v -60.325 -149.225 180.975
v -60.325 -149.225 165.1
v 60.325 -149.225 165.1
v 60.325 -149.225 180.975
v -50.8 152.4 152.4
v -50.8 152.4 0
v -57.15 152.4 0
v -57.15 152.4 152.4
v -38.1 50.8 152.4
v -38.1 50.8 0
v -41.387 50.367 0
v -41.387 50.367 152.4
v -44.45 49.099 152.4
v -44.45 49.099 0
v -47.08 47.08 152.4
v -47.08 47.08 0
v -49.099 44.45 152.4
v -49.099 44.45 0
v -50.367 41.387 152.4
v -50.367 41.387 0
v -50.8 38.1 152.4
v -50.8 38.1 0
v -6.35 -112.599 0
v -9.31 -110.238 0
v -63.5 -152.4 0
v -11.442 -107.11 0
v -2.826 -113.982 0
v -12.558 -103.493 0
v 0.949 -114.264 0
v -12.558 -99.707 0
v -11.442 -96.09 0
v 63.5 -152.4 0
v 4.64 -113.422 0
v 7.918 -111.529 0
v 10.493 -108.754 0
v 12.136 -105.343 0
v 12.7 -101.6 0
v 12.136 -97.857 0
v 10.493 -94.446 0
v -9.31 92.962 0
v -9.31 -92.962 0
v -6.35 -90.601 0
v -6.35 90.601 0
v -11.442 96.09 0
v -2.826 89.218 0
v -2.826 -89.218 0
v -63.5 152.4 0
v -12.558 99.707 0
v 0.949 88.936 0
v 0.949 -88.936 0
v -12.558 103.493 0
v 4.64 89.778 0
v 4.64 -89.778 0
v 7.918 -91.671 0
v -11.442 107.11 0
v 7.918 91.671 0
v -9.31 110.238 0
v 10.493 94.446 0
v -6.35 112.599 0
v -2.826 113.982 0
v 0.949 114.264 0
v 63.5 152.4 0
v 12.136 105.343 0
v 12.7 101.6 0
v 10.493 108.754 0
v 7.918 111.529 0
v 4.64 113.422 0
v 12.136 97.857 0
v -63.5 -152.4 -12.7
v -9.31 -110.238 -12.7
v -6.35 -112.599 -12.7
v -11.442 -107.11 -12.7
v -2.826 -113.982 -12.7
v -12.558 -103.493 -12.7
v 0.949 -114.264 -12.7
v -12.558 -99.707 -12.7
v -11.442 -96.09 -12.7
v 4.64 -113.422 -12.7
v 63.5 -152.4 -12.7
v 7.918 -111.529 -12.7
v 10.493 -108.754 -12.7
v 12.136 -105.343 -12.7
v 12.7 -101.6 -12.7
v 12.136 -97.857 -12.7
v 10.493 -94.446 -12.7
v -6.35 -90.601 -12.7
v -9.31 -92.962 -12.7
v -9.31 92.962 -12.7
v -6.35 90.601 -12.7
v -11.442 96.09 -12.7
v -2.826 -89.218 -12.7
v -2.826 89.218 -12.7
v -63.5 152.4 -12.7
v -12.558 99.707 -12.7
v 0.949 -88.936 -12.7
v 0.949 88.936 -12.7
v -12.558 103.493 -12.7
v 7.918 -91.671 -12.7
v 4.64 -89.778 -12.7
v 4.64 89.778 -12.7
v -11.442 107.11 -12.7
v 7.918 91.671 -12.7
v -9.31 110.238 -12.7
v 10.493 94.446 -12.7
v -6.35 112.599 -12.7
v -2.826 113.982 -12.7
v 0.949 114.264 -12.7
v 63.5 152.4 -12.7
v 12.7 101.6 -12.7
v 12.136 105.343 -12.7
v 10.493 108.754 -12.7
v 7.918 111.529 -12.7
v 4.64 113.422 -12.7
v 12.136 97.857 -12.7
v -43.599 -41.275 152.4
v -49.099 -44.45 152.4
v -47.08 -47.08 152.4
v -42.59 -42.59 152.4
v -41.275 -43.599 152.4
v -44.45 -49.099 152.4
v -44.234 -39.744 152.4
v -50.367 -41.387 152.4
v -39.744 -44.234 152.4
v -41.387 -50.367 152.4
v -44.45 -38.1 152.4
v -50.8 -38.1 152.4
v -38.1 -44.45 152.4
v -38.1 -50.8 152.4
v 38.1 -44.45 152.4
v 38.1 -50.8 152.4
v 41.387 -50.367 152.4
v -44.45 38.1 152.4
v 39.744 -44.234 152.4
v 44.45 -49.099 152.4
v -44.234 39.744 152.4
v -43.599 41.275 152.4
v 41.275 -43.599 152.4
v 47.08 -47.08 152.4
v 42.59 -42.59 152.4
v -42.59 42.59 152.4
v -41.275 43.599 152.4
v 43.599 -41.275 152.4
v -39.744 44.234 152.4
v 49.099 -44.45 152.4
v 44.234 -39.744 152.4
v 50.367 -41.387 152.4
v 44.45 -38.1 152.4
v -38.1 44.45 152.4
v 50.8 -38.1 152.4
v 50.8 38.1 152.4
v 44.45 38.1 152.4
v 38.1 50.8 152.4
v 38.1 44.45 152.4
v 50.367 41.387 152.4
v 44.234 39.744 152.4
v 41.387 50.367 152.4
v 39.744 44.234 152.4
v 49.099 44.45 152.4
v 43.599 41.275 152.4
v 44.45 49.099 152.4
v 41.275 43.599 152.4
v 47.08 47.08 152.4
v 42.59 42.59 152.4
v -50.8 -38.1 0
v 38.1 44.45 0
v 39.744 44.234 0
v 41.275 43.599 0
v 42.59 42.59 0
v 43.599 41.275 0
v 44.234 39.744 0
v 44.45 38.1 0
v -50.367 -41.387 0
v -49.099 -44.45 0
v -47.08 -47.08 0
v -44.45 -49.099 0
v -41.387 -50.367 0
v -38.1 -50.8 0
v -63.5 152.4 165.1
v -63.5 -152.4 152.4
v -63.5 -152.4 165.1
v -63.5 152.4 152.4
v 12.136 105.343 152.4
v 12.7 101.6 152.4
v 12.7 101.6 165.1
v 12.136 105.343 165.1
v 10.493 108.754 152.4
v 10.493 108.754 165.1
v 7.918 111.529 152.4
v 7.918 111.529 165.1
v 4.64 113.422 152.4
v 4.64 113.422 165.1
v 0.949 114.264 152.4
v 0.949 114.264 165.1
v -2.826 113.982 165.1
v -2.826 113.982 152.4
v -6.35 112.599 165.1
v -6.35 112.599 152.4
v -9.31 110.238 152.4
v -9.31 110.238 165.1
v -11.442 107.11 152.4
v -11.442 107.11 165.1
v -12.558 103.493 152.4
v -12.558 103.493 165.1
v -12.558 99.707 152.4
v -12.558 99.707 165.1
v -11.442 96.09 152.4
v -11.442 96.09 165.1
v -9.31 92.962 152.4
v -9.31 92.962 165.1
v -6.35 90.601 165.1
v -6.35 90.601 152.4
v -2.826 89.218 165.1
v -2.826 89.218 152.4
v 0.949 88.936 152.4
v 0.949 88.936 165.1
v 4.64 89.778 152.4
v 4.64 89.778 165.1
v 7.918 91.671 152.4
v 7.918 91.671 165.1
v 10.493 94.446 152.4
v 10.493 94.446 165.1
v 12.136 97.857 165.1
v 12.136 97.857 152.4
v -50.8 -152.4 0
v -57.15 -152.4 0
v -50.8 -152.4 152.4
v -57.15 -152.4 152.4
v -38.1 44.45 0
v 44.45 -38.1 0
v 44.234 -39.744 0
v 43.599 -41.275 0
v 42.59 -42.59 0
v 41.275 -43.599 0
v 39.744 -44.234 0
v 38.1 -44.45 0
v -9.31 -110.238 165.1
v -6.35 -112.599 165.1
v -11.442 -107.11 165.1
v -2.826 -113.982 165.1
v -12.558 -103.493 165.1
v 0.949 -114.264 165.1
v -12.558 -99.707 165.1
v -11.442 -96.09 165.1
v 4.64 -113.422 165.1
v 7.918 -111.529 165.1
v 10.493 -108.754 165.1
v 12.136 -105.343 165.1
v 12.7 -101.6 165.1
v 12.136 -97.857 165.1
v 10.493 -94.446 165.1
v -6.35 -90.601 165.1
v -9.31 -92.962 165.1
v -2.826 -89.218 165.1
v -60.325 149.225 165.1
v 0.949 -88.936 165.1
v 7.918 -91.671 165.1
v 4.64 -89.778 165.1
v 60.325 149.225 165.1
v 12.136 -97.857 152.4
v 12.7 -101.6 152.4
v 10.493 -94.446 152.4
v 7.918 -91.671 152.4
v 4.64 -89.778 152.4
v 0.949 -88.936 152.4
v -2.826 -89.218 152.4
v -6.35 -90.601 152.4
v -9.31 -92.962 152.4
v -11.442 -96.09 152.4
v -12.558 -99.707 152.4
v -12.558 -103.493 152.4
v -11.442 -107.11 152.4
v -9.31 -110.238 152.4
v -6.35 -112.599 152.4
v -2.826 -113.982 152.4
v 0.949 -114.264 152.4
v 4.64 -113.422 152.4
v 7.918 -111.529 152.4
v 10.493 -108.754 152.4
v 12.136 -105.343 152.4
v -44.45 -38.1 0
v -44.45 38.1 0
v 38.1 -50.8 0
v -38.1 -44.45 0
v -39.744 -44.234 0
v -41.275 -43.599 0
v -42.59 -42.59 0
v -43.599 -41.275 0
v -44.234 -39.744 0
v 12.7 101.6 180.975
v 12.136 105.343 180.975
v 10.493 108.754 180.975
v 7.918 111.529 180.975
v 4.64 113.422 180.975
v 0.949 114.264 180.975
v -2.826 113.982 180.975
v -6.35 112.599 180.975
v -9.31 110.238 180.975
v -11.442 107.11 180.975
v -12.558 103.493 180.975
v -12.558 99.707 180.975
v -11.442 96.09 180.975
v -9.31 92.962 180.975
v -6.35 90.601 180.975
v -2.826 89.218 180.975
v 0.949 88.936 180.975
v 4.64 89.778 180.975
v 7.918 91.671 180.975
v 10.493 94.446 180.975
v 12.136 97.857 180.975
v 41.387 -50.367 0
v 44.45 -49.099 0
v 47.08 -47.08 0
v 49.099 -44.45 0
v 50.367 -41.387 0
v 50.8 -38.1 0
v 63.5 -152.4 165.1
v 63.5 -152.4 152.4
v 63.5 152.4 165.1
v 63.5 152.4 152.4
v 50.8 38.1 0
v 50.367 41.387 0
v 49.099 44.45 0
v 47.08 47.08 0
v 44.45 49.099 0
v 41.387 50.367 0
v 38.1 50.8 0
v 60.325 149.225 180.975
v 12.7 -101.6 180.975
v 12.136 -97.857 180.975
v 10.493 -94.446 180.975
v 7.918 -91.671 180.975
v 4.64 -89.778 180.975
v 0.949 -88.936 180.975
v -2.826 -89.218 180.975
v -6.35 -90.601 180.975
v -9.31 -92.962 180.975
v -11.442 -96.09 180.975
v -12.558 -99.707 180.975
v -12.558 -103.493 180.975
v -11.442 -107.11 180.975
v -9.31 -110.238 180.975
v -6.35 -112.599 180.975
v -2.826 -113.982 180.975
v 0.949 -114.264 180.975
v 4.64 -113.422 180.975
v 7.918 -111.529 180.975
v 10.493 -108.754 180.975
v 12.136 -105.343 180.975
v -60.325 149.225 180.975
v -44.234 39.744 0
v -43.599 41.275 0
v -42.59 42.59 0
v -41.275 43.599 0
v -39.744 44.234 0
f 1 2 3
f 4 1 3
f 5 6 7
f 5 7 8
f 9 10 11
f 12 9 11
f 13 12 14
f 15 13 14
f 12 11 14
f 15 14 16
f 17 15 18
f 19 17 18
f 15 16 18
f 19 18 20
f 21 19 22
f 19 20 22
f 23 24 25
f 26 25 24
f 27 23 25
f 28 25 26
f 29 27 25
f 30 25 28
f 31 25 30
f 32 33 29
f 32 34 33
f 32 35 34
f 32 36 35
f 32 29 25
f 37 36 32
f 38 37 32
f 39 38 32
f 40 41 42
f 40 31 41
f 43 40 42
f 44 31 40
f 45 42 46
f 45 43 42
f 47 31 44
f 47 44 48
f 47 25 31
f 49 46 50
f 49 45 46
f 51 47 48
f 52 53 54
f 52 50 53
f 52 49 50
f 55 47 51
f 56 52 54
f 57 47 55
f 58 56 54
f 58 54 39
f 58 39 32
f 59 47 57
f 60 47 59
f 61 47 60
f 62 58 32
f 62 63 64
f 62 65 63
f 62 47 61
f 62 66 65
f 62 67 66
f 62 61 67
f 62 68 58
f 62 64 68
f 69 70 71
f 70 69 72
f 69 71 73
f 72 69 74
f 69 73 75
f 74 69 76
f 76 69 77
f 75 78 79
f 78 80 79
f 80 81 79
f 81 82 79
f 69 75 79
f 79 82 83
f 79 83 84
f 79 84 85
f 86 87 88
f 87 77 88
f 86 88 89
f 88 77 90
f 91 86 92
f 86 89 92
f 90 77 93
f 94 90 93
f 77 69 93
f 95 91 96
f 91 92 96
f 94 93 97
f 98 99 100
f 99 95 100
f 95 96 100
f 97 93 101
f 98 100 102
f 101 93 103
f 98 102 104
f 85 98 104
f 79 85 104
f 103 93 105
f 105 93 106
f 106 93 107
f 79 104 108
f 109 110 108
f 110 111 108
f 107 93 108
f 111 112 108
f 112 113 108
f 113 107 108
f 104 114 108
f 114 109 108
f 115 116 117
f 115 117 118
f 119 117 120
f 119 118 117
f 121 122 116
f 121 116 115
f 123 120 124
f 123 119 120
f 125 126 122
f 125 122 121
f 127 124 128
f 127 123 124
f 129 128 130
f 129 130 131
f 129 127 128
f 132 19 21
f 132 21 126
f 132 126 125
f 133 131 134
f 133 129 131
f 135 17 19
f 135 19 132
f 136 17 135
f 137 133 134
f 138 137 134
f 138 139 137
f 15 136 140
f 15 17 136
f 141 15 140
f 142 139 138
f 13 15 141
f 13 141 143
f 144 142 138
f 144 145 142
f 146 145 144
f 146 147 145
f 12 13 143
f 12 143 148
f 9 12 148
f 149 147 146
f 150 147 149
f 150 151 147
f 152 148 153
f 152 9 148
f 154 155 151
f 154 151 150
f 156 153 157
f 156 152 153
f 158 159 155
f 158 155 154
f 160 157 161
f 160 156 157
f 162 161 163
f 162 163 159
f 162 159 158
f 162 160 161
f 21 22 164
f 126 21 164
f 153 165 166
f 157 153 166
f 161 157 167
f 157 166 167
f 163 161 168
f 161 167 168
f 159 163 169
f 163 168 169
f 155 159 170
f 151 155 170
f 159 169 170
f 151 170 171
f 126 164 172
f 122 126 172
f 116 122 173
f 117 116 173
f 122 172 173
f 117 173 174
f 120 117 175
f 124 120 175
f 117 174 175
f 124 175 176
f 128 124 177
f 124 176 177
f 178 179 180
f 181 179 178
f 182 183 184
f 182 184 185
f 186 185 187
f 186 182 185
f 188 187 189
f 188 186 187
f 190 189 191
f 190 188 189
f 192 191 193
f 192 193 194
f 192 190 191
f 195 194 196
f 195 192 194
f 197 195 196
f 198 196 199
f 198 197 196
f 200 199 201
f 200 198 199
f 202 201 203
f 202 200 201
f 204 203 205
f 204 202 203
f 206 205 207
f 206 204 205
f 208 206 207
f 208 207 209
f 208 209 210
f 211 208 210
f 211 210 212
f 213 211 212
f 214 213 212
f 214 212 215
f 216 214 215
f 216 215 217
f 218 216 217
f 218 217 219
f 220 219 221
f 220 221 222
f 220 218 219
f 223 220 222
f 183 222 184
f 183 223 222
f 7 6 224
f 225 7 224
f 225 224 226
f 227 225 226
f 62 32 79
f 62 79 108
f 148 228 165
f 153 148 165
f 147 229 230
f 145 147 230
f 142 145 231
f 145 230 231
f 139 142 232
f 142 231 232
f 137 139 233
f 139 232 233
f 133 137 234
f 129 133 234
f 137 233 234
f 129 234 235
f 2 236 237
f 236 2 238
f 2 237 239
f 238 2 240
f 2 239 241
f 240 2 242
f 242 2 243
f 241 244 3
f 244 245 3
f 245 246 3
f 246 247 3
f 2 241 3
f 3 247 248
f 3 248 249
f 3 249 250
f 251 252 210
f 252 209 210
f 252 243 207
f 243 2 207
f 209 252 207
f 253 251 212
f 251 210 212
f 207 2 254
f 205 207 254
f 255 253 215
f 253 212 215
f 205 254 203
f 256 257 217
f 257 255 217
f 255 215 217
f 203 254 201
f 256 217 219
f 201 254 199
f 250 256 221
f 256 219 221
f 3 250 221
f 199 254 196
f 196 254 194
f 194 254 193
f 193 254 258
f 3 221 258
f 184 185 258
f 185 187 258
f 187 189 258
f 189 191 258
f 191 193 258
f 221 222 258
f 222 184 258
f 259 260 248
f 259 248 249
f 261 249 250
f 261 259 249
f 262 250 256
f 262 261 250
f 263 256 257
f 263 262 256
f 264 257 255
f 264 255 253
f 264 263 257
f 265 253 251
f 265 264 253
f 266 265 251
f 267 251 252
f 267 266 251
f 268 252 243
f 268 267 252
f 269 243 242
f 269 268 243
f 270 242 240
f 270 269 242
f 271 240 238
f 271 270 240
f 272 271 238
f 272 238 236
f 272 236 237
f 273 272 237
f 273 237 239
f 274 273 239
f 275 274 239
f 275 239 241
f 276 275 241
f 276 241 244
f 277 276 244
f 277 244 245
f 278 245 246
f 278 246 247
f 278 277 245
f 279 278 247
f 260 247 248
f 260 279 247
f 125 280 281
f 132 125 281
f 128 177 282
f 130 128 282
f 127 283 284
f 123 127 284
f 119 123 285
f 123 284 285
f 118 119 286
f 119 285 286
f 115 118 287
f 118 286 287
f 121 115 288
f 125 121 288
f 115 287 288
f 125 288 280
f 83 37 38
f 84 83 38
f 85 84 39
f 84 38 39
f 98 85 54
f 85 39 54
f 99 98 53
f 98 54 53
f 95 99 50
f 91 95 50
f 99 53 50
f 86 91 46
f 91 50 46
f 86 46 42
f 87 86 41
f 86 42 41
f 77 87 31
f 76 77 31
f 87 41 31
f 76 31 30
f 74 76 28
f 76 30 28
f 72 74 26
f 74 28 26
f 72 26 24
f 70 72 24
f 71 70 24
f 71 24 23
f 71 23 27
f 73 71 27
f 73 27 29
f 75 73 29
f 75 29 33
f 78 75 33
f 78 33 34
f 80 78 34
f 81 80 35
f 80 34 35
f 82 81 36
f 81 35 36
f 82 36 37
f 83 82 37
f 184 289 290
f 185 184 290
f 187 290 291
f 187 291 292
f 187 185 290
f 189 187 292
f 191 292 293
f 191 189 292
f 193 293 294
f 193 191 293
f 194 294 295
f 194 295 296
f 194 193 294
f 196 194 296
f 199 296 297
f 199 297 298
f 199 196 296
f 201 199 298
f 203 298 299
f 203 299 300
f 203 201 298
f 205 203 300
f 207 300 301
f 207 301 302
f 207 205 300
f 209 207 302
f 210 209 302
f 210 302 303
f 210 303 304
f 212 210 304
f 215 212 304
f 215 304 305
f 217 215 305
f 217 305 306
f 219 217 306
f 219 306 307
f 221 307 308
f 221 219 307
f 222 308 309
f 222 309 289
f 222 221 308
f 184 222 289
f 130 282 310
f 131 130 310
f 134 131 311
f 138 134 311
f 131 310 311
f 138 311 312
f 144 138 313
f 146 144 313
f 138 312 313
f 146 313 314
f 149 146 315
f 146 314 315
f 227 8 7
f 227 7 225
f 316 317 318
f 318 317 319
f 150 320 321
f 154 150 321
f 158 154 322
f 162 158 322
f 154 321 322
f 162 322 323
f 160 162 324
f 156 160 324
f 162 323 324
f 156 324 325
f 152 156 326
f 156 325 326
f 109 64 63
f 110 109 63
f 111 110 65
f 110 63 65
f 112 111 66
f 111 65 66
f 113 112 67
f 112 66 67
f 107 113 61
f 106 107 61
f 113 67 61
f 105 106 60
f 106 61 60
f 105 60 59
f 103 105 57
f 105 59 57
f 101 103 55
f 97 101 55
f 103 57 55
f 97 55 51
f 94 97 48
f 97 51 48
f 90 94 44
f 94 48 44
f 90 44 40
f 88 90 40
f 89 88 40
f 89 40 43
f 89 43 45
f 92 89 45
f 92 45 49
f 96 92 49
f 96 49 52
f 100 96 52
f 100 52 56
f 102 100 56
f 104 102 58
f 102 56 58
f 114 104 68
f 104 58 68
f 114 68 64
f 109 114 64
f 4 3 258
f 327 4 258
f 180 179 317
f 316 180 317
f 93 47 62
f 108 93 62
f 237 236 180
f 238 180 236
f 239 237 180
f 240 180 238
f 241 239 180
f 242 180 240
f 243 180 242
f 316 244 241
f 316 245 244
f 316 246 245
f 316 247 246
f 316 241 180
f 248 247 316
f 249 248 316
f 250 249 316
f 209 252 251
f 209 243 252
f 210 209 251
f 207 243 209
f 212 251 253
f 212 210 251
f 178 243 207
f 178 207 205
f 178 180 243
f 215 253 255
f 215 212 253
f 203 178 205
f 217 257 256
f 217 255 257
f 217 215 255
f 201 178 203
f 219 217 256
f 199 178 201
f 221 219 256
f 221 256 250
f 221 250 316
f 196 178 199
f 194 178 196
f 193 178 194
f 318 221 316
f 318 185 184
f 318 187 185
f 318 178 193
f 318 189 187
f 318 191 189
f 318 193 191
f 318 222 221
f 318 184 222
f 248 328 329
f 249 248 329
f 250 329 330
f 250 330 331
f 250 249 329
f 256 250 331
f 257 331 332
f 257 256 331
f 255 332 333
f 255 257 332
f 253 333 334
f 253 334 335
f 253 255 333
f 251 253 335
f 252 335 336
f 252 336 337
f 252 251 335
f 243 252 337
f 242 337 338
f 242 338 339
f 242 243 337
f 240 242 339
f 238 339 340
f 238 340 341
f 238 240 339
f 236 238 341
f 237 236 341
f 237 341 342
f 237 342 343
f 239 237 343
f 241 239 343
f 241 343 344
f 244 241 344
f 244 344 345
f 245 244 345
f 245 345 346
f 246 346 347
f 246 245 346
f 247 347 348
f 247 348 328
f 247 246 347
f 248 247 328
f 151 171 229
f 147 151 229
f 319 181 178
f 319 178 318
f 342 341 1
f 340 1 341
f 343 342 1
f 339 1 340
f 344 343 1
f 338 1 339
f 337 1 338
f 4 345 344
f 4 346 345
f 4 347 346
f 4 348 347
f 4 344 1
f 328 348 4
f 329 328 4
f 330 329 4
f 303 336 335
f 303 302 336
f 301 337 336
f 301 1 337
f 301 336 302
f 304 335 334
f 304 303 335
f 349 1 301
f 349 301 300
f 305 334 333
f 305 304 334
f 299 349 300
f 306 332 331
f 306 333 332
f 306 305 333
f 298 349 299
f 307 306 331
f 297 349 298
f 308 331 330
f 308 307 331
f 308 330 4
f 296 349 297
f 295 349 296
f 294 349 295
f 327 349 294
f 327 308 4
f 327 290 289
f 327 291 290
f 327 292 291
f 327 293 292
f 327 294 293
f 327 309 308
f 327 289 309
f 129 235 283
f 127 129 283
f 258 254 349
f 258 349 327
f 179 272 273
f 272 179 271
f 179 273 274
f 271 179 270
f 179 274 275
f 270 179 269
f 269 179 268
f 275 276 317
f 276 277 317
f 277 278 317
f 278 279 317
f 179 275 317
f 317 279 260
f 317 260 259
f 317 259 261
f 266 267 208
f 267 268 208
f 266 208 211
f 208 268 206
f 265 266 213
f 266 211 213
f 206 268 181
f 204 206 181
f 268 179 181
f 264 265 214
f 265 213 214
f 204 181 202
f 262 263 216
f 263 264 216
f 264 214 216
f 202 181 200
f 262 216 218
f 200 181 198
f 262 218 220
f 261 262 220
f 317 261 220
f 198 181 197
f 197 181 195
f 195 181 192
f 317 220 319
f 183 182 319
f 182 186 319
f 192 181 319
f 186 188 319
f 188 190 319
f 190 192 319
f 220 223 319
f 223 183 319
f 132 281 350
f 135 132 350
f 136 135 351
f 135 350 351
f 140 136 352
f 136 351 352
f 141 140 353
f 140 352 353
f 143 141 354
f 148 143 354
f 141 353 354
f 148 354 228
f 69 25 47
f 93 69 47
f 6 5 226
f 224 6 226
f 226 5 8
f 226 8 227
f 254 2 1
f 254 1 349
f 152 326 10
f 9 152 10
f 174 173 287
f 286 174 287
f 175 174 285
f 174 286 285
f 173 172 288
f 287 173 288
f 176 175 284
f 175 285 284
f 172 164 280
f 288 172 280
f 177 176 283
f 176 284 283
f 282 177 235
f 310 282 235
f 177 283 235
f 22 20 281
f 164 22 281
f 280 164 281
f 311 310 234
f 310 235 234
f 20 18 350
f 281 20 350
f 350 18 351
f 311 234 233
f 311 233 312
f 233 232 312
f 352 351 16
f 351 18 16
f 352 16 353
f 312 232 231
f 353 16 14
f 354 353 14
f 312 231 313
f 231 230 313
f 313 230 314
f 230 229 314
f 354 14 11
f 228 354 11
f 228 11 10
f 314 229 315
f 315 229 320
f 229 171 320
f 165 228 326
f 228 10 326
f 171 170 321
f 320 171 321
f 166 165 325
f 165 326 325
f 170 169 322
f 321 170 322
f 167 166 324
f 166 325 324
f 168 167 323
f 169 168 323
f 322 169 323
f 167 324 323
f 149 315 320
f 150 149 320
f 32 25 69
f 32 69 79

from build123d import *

# Parameters (mm, degrees)
F0_W      = 127
F0_H      = 304.8
F0_R      = 12.7
F1_DEPTH  = 12.7
F3_DEPTH  = 152.4
F7_W      = 304.8
F7_H      = 152.4
F8_DEPTH  = 6.35
F9_W      = 120.65
F9_H      = 298.45
F9_R      = 12.7
F10_DEPTH = 15.875


with BuildPart() as f1:
    # F0 (on Top) → F1 (new body)
    with BuildSketch(Plane.XY):
        Rectangle(F0_W, F0_H)
        with Locations((0, -101.6)):
            Circle(F0_R, mode=Mode.SUBTRACT)
        with Locations((0, 101.6)):
            Circle(F0_R, mode=Mode.SUBTRACT)
    extrude(amount=-F1_DEPTH)


with BuildPart() as f3:
    # F2 (on face) → F3 (new body)
    with BuildSketch(Plane.XY):
        with BuildLine():
            Line((38.1, 50.8), (-38.1, 50.8))
            ThreePointArc((-38.1, 50.8), (-47.0802561211, 47.0802561211), (-50.8, 38.1))
            Line((-50.8, 38.1), (-50.8, -38.1))
            ThreePointArc((-50.8, -38.1), (-47.0802561211, -47.0802561211), (-38.1, -50.8))
            Line((-38.1, -50.8), (38.1, -50.8))
            ThreePointArc((38.1, -50.8), (47.0802561211, -47.0802561211), (50.8, -38.1))
            Line((50.8, -38.1), (50.8, 38.1))
            ThreePointArc((50.8, 38.1), (47.0802561211, 47.0802561211), (38.1, 50.8))
        make_face()
        with BuildLine():
            ThreePointArc((-44.45, 38.1), (-42.5901280605, 42.5901280605), (-38.1, 44.45))
            Line((-38.1, 44.45), (38.1, 44.45))
            ThreePointArc((38.1, 44.45), (42.5901280605, 42.5901280605), (44.45, 38.1))
            Line((44.45, 38.1), (44.45, -38.1))
            ThreePointArc((44.45, -38.1), (42.5901280605, -42.5901280605), (38.1, -44.45))
            Line((38.1, -44.45), (-38.1, -44.45))
            ThreePointArc((-38.1, -44.45), (-42.5901280605, -42.5901280605), (-44.45, -38.1))
            Line((-44.45, -38.1), (-44.45, 38.1))
        make_face(mode=Mode.SUBTRACT)
    extrude(amount=F3_DEPTH)


with BuildPart() as f6_1:
    # F6: instance of F1
    add(f1.part.mirror(Plane.XY.offset(76.2)))


with BuildPart() as f8:
    # F7 (on face) → F8 (new body)
    with BuildSketch(Plane(origin=(-50.8, 0, 0), x_dir=(0, -1, 0), z_dir=(-1, 0, 0))):
        with Locations((0, 76.2)):
            Rectangle(F7_W, F7_H)
    extrude(amount=F8_DEPTH)


with BuildPart() as f10:
    # F9 (on face) → F10 (new body)
    with BuildSketch(Plane.XY.offset(165.1)):
        Rectangle(F9_W, F9_H)
        with Locations((0, -101.6)):
            Circle(F9_R, mode=Mode.SUBTRACT)
        with Locations((0, 101.6)):
            Circle(F9_R, mode=Mode.SUBTRACT)
    extrude(amount=F10_DEPTH)


solid = Compound([f1.part, f3.part, f6_1.part, f8.part, f10.part])
